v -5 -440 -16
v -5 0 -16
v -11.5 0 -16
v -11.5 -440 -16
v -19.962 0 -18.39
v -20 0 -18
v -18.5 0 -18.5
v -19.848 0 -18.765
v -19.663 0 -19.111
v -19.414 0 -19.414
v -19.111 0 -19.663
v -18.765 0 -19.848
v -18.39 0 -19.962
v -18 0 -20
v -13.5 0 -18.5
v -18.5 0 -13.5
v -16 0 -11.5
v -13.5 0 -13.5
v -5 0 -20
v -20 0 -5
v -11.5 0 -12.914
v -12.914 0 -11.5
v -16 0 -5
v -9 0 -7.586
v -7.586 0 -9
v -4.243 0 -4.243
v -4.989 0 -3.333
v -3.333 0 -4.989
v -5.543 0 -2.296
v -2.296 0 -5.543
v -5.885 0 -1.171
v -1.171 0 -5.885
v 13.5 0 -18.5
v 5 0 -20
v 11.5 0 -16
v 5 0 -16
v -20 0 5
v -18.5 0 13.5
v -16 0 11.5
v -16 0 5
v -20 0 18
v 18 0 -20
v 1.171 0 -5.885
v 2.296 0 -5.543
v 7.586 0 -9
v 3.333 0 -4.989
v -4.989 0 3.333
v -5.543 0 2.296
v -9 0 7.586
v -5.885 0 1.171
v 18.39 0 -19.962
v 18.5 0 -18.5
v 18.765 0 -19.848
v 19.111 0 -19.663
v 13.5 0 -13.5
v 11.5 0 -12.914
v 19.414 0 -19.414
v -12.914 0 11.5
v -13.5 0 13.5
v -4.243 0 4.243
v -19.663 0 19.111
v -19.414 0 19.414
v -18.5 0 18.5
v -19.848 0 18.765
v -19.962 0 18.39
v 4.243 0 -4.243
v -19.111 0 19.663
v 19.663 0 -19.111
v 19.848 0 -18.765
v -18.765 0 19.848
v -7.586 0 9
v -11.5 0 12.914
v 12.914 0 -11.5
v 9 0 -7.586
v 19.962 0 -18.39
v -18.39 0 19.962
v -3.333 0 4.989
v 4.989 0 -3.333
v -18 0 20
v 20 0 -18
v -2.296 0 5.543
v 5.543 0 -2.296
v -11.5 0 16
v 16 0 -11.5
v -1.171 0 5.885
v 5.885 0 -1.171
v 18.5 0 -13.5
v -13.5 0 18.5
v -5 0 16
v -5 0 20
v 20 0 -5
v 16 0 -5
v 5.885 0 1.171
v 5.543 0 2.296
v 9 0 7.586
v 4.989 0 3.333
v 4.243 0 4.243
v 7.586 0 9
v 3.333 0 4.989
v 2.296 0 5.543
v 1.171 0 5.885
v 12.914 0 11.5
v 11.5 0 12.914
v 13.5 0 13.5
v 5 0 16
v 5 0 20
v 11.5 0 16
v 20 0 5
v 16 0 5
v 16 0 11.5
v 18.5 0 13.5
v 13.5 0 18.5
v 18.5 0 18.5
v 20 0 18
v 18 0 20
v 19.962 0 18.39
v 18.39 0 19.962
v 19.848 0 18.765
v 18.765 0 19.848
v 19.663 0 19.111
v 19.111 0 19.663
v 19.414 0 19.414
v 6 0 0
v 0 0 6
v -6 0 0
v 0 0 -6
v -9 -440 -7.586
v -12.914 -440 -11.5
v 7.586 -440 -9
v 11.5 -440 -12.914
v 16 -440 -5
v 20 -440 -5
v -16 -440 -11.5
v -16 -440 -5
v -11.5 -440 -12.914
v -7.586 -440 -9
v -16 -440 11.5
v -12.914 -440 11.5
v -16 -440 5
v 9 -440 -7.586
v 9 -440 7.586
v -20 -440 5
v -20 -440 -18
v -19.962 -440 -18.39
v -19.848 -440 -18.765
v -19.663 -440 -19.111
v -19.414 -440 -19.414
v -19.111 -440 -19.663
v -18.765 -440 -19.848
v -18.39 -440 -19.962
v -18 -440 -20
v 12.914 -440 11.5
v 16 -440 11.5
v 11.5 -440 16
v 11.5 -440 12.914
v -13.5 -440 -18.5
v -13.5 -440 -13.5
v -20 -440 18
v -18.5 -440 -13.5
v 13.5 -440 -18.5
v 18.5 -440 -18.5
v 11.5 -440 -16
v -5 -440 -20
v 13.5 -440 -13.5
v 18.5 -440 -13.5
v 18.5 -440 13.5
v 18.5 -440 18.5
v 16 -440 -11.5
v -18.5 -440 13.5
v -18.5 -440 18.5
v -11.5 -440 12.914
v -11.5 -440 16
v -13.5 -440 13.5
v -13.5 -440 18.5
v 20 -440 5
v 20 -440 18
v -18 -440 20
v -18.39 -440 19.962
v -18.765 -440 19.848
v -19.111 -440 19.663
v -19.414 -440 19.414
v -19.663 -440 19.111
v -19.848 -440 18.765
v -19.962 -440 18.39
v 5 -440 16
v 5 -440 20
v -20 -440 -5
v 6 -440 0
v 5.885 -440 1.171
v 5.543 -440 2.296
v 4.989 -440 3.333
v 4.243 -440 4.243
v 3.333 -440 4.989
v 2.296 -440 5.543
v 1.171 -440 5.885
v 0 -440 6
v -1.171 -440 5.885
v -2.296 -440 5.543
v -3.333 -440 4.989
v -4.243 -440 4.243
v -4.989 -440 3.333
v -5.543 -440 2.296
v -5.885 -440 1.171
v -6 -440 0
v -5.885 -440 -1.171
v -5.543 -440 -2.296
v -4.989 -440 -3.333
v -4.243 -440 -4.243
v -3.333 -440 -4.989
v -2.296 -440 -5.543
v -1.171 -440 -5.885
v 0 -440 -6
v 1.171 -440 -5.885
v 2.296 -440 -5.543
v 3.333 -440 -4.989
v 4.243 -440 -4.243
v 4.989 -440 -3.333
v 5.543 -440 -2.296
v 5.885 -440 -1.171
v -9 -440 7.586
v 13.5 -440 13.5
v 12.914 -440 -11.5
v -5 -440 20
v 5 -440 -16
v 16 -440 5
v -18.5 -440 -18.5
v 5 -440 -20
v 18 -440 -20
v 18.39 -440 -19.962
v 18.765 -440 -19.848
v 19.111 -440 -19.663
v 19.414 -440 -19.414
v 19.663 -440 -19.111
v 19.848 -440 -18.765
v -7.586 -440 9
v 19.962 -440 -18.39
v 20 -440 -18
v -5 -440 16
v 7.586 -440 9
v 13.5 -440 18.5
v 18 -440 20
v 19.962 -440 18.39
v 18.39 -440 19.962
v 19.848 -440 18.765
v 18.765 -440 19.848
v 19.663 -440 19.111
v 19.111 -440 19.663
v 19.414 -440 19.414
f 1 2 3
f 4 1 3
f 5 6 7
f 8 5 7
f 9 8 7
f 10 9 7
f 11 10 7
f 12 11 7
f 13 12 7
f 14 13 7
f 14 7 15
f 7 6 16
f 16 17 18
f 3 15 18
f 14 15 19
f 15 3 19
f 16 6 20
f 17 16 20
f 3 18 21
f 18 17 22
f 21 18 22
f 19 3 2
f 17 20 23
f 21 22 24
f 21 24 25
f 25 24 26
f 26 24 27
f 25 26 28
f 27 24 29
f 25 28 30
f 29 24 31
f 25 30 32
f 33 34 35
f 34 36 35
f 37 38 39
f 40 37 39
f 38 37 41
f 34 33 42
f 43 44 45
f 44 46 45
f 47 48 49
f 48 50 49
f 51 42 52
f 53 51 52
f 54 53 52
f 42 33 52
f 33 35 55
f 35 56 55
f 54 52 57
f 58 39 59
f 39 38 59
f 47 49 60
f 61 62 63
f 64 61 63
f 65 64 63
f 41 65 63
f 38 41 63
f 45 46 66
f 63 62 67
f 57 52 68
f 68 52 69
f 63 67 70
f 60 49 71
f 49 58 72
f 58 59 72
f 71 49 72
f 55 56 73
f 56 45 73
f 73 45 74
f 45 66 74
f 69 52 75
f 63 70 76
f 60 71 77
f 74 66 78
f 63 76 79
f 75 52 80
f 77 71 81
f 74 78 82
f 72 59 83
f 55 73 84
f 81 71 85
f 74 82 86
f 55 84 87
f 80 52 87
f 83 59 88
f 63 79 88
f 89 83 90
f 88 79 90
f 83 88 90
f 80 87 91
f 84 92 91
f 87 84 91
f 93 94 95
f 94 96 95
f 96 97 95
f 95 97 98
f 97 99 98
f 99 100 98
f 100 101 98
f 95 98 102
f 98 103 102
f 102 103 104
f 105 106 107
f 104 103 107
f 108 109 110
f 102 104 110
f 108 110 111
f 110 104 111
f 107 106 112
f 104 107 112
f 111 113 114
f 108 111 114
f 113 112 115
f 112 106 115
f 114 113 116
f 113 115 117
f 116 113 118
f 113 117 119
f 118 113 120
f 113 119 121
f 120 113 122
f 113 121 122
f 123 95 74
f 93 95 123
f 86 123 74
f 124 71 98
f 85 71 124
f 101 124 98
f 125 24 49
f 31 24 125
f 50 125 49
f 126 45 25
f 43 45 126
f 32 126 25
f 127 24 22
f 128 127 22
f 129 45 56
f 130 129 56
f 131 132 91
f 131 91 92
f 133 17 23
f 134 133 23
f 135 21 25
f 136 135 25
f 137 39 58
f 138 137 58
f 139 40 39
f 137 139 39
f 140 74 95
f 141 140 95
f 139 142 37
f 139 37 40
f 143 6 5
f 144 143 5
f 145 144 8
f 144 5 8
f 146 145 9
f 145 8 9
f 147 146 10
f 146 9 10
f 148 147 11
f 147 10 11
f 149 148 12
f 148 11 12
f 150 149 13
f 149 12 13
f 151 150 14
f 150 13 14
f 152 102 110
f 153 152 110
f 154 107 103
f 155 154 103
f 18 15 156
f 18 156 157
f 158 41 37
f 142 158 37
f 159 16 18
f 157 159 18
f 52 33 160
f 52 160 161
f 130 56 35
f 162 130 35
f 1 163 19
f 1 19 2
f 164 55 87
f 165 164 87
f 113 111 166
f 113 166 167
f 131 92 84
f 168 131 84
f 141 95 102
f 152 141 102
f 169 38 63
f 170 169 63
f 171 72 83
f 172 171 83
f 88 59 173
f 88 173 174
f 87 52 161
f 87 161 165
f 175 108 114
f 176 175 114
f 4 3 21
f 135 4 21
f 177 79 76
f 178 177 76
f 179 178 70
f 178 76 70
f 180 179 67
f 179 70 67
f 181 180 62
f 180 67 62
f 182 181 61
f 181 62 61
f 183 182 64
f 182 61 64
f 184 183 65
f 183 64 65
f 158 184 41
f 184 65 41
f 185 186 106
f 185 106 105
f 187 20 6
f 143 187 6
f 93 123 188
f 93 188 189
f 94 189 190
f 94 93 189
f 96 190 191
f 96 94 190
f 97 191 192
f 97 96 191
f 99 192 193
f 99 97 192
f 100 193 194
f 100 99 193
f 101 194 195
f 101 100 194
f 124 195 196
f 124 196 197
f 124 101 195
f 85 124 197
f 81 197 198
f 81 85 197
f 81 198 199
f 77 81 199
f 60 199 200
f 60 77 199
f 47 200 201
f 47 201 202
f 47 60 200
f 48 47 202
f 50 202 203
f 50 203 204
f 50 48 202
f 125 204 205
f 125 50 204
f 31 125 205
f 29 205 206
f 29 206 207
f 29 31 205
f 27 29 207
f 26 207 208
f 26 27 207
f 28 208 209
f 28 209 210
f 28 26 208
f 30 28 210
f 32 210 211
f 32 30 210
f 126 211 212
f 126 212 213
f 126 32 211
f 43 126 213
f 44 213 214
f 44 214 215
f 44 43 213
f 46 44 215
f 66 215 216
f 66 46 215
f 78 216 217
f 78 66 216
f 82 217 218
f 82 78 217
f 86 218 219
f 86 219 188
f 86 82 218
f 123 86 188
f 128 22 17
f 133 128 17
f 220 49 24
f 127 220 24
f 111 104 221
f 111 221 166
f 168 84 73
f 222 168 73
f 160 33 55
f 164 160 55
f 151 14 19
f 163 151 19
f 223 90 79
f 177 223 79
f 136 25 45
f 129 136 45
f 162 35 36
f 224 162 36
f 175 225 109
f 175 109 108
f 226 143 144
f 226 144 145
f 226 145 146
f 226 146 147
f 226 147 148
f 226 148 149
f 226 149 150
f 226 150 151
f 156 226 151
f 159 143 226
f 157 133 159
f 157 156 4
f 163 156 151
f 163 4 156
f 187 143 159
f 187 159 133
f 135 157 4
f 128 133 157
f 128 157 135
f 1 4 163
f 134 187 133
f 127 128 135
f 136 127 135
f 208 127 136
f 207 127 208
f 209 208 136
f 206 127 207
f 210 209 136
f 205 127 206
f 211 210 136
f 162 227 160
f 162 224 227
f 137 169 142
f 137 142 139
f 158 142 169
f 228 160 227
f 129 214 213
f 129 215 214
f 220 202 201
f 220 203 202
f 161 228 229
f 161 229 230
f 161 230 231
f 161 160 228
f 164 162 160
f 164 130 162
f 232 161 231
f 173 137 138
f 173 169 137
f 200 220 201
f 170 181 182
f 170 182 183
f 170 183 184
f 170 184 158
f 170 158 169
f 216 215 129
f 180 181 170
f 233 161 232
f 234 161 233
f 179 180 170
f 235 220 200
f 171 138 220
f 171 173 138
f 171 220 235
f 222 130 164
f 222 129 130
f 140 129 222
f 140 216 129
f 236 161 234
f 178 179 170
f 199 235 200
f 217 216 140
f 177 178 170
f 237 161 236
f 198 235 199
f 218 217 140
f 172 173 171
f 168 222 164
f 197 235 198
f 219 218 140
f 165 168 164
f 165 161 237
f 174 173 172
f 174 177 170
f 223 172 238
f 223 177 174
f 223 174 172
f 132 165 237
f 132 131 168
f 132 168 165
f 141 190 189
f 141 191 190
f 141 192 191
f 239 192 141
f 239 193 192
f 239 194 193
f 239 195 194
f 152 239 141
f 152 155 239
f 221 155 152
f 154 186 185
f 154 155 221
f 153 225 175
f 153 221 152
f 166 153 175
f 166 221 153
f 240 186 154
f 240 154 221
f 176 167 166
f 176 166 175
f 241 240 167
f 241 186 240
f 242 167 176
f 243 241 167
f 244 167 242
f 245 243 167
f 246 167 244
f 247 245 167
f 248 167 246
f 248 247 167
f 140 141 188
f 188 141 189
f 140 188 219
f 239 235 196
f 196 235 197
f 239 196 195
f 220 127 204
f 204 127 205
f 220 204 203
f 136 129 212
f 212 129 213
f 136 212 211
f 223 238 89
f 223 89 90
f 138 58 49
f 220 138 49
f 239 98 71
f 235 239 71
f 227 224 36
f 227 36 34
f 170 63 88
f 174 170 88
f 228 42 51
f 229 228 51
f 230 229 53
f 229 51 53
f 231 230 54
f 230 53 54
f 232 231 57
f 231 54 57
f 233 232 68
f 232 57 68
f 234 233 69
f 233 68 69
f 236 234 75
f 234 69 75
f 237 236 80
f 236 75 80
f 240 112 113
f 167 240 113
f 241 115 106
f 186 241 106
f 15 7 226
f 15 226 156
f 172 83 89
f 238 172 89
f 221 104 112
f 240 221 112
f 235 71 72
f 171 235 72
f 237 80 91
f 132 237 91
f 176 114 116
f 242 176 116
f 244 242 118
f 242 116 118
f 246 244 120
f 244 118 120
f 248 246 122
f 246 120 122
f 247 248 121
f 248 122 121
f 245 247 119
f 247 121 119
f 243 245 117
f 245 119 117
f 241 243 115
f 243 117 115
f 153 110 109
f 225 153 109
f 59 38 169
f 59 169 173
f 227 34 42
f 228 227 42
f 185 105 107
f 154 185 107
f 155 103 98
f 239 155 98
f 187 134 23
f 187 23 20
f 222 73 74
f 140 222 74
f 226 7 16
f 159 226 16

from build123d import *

# Parameters (mm, degrees)
F0_W     = 5
F0_H     = 5
F0_R     = 6
F1_DEPTH = 440


with BuildPart() as f1:
    # F0 (on Front) → F1 (new body)
    with BuildSketch(Plane.XZ):
        with BuildLine():
            Line((5, -20), (18, -20))
            ThreePointArc((18, -20), (19.414214, -19.414214), (20, -18))
            Line((20, -18), (20, -5))
            Line((20, -5), (16, -5))
            Line((16, -5), (16, -11.5))
            Line((16, -11.5), (12.914214, -11.5))
            Line((12.914214, -11.5), (9, -7.585786))
            Line((9, -7.585786), (9, 0))
            Line((9, 0), (9, 7.585786))
            Line((9, 7.585786), (12.914214, 11.5))
            Line((12.914214, 11.5), (16, 11.5))
            Line((16, 11.5), (16, 5))
            Line((16, 5), (20, 5))
            Line((20, 5), (20, 18))
            ThreePointArc((20, 18), (19.414214, 19.414214), (18, 20))
            Line((18, 20), (5, 20))
            Line((5, 20), (5, 16))
            Line((5, 16), (11.5, 16))
            Line((11.5, 16), (11.5, 12.914214))
            Line((11.5, 12.914214), (7.585786, 9))
            Line((7.585786, 9), (0, 9))
            Line((0, 9), (-7.585786, 9))
            Line((-7.585786, 9), (-11.5, 12.914214))
            Line((-11.5, 12.914214), (-11.5, 16))
            Line((-11.5, 16), (-5, 16))
            Line((-5, 16), (-5, 20))
            Line((-5, 20), (-18, 20))
            ThreePointArc((-18, 20), (-19.414214, 19.414214), (-20, 18))
            Line((-20, 18), (-20, 5))
            Line((-20, 5), (-16, 5))
            Line((-16, 5), (-16, 11.5))
            Line((-16, 11.5), (-12.914214, 11.5))
            Line((-12.914214, 11.5), (-9, 7.585786))
            Line((-9, 7.585786), (-9, 0))
            Line((-9, 0), (-9, -7.585786))
            Line((-9, -7.585786), (-12.914214, -11.5))
            Line((-12.914214, -11.5), (-16, -11.5))
            Line((-16, -11.5), (-16, -5))
            Line((-16, -5), (-20, -5))
            Line((-20, -5), (-20, -18))
            ThreePointArc((-20, -18), (-19.414214, -19.414214), (-18, -20))
            Line((-18, -20), (-5, -20))
            Line((-5, -20), (-5, -16))
            Line((-5, -16), (-11.5, -16))
            Line((-11.5, -16), (-11.5, -12.914214))
            Line((-11.5, -12.914214), (-7.585786, -9))
            Line((-7.585786, -9), (0, -9))
            Line((0, -9), (7.585786, -9))
            Line((7.585786, -9), (11.5, -12.914214))
            Line((11.5, -12.914214), (11.5, -16))
            Line((11.5, -16), (5, -16))
            Line((5, -16), (5, -20))
        make_face()
        with Locations((-16, -16)):
            Rectangle(F0_W, F0_H, mode=Mode.SUBTRACT)
        with Locations((16, -16)):
            Rectangle(F0_W, F0_H, mode=Mode.SUBTRACT)
        with Locations((-16, 16)):
            Rectangle(F0_W, F0_H, mode=Mode.SUBTRACT)
        Circle(F0_R, mode=Mode.SUBTRACT)
        with Locations((16, 16)):
            Rectangle(F0_W, F0_H, mode=Mode.SUBTRACT)
    extrude(amount=F1_DEPTH)


solid = f1.part
